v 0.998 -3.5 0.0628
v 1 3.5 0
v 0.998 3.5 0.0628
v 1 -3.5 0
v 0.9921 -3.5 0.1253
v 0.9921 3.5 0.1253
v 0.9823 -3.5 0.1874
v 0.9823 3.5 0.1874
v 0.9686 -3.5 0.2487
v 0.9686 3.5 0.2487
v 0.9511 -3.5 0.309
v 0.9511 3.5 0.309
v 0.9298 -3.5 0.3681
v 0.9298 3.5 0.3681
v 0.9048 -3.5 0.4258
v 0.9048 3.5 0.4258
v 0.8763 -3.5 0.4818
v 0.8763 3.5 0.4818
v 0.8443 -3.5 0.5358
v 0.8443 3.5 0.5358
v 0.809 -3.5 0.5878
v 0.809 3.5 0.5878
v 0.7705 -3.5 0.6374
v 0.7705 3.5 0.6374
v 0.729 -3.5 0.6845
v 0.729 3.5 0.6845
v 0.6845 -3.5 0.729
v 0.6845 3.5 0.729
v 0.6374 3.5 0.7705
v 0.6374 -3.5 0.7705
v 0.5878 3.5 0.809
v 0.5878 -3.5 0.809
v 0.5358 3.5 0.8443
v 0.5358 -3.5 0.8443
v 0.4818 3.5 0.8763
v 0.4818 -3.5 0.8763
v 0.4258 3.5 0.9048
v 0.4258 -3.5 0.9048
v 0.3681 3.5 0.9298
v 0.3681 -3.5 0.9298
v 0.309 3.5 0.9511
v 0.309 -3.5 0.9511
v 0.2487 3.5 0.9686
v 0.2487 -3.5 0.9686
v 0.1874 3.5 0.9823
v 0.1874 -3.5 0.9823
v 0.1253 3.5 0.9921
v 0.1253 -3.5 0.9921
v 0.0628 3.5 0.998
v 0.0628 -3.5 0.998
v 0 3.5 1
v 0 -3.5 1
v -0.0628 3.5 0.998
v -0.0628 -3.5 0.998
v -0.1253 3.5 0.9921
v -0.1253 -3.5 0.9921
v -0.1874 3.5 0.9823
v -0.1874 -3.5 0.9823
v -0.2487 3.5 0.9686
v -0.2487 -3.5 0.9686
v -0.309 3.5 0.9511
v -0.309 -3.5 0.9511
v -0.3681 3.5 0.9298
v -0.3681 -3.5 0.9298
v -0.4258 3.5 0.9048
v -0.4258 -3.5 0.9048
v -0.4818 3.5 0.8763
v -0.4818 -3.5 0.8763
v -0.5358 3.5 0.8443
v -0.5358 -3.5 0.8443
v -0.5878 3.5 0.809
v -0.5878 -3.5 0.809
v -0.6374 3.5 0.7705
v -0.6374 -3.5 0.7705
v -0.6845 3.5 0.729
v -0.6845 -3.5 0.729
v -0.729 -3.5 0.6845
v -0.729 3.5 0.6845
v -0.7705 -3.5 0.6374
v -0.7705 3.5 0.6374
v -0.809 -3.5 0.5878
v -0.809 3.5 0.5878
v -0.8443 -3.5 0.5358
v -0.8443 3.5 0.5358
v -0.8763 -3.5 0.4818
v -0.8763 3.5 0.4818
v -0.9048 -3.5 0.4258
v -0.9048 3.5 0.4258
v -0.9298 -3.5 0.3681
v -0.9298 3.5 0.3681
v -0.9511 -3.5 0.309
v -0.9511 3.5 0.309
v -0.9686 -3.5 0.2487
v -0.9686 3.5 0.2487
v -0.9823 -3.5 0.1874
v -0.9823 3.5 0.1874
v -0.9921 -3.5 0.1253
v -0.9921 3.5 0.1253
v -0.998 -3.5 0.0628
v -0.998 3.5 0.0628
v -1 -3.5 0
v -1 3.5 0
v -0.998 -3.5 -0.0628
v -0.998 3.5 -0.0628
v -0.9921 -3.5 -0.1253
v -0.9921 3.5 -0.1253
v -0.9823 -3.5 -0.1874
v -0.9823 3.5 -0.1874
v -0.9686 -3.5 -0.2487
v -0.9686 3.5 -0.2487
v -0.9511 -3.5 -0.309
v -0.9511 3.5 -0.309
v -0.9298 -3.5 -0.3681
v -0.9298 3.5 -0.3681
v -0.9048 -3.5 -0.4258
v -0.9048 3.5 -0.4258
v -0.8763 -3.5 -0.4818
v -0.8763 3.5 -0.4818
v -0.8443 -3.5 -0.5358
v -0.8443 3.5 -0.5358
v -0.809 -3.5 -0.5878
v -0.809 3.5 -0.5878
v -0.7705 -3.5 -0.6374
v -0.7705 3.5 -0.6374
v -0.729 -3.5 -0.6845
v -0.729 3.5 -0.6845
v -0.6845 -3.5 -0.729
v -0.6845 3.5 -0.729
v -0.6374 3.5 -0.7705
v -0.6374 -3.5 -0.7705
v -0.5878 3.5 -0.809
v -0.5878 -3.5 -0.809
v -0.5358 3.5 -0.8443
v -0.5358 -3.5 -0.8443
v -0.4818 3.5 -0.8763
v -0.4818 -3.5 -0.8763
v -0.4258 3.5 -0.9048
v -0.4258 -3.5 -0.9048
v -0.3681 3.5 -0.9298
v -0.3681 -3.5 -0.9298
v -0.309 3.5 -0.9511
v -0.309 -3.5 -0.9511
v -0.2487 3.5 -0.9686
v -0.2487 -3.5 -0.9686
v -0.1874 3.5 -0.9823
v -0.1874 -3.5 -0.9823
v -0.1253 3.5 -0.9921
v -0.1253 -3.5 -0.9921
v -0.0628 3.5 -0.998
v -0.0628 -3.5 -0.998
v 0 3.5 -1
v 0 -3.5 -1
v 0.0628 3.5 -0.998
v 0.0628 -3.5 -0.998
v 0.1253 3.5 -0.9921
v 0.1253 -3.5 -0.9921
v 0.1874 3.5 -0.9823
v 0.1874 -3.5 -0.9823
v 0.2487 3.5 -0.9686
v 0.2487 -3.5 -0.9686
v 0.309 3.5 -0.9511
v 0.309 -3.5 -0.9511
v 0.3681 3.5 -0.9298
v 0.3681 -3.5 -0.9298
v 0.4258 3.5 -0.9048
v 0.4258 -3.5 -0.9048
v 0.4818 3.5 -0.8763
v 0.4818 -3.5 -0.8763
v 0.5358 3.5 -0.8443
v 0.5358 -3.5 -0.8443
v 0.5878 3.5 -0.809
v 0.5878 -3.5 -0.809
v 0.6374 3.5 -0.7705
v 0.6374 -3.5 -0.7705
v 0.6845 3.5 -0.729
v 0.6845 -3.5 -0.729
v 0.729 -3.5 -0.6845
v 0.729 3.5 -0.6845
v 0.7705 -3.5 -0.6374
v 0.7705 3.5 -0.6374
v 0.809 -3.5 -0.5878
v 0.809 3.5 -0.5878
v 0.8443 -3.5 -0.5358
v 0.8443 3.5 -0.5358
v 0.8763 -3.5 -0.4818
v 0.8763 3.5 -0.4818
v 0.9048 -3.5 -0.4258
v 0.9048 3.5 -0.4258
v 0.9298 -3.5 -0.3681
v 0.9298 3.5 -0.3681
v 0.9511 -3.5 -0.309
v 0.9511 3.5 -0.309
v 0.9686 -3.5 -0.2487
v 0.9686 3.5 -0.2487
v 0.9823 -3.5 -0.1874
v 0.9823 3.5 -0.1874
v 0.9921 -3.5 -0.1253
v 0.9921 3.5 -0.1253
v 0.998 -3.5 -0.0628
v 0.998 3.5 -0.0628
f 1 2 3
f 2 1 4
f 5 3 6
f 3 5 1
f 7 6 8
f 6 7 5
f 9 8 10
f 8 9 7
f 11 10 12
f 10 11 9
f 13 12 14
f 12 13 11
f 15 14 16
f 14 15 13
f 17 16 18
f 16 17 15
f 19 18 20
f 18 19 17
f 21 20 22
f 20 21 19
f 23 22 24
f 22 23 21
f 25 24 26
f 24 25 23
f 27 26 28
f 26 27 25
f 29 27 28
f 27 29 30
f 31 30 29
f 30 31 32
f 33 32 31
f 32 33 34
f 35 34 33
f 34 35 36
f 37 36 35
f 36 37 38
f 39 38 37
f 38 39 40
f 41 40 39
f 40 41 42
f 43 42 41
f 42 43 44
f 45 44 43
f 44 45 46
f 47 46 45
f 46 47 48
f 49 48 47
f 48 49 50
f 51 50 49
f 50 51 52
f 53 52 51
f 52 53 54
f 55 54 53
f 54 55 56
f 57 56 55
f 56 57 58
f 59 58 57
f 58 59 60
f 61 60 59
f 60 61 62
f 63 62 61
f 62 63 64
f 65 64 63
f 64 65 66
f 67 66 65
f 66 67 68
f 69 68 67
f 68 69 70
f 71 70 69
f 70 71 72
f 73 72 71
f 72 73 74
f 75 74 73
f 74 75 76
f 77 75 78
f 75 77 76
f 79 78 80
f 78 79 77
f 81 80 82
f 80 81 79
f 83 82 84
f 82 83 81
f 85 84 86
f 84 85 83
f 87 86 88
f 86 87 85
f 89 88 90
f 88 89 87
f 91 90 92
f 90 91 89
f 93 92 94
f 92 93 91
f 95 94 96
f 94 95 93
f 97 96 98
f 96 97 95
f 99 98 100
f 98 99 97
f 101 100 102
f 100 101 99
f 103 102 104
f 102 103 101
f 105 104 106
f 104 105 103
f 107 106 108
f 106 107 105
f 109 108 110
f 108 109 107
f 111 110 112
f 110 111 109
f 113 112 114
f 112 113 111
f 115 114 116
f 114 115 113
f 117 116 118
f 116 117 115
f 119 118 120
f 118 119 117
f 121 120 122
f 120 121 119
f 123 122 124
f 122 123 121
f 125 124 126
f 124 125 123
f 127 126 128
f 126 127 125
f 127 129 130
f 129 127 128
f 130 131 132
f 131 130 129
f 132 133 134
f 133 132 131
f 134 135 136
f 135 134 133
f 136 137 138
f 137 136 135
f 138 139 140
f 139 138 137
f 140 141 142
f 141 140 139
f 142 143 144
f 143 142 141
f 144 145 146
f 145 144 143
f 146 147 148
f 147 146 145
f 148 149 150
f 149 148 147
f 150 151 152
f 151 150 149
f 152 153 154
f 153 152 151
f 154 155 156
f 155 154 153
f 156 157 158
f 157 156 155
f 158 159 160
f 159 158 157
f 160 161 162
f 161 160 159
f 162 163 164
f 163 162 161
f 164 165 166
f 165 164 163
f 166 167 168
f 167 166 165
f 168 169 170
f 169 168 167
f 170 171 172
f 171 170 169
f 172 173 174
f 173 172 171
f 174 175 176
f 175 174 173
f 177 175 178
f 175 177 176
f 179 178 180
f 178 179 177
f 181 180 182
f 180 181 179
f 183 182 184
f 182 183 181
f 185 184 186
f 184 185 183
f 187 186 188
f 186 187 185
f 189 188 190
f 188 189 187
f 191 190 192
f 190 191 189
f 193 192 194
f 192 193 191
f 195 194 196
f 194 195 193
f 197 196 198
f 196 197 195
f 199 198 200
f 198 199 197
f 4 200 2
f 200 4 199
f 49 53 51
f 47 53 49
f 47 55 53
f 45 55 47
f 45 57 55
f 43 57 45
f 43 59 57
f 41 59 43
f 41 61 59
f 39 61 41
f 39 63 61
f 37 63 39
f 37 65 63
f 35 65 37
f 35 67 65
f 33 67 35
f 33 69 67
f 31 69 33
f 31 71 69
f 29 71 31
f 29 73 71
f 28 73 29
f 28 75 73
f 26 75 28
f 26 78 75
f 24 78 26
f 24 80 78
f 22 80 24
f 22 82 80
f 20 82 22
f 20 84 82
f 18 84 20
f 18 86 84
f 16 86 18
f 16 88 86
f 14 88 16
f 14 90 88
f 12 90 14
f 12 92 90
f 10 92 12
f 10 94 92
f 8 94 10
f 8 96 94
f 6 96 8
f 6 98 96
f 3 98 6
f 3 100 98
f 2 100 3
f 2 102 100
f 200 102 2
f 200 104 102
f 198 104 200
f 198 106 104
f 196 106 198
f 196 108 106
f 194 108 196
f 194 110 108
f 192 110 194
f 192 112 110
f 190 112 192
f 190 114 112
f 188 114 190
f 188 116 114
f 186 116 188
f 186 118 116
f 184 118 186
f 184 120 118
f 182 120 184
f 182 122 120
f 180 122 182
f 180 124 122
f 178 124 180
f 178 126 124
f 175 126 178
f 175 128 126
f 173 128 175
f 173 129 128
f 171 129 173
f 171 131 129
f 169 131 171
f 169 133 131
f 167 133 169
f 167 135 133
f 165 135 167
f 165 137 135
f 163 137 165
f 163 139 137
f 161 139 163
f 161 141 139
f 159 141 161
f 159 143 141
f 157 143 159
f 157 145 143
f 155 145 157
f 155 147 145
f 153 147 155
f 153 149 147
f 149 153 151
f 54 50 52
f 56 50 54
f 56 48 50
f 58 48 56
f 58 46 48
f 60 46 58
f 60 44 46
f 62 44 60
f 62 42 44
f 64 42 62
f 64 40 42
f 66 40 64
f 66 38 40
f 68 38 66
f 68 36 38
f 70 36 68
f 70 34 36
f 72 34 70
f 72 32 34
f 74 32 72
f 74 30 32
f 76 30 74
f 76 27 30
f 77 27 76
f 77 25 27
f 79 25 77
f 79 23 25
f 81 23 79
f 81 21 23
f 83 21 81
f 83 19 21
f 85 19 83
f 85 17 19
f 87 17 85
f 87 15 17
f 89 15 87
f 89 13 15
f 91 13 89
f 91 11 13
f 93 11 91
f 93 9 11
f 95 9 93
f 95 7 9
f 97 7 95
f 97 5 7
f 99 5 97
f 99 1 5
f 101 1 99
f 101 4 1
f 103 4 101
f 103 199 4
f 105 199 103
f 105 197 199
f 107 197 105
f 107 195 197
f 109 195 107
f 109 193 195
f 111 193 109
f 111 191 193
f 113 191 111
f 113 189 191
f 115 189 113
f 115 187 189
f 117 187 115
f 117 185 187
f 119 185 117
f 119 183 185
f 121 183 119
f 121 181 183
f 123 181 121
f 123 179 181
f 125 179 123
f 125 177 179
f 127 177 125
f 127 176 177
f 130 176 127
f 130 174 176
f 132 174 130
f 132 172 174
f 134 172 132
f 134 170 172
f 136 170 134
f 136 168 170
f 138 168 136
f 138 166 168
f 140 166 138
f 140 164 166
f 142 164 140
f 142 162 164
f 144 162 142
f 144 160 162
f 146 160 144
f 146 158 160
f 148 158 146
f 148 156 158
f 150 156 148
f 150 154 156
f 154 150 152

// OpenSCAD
// ===============================
// Pieza: eje_pata
// Función: Sirve como eje para las patas abatibles del tablero
// Autor: Carlos & ChatGPT
// ===============================

// Parámetros principales
// altura_cuerpo = 3.7;
// ancho_cuerpo = 3.0;
// profundidad_cuerpo = 2.0;

// radio_semicirculo = 1.5;
// altura_semicirculo = radio_semicirculo;

// radio_cilindro = 1.5;
// largo_cilindro = 7.0; // total, sobresale a ambos lados

// radio_agujero = 1.0; // para insertar la pata

// $fn = 100; // suavizado

// // ===============================
// // Módulo principal
// module eje_pata() {
    
//     // --- Parte rectangular ---
//     cube([ancho_cuerpo, profundidad_cuerpo, altura_cuerpo]);

//     // --- Parte superior semicilíndrica ---
//     translate([0, 0, altura_cuerpo])
//         cylinder(h=altura_semicirculo, r=radio_semicirculo);

//     // --- Cilindro horizontal que atraviesa la pieza ---
//     translate([-largo_cilindro/2 + ancho_cuerpo/2, profundidad_cuerpo/2, altura_cuerpo - 2.2])
//         rotate([0, 90, 0])
//             cylinder(h=largo_cilindro, r=radio_cilindro);

//     // --- Agujero interno para insertar la pata ---
//     translate([-largo_cilindro/2 + ancho_cuerpo/2, profundidad_cuerpo/2, altura_cuerpo - 2.2])
//         rotate([0, 90, 0])
//             cylinder(h=largo_cilindro, r=radio_agujero);
// }

// // Llamada al módulo
// eje_pata();


//////
// ===============================
// Pieza: eje_pata
// Función: Sirve como eje para las patas abatibles del tablero
// Autor: Carlos & ChatGPT
// ===============================


// ==========================
// Parámetros configurables
// ==========================
radio_eje = 1.0;       // 1 cm = diámetro 2 cm
largo_eje = 7.0;       // 7 cm de largo
$fn = 100;             // suavidad del cilindro

// ==========================
// Módulo de eje horizontal
// ==========================
module eje_horizontal() {
    rotate([90, 0, 0])  // gira para alinearse con eje Y
        cylinder(h = largo_eje, r = radio_eje, center = true);
}

// Llamada al módulo
eje_horizontal();

// $fn = 100; // suavizado

// module aro_sobre_eje() {
//     difference() {
//         // Círculo exterior (diámetro 2 cm, radio 1 cm)
//         translate([0, 0, 0])
//             cylinder(h=2.0, r=1.0, center=true);

//         // Agujero interior (diámetro 1 cm, radio 0.5 cm)
//         translate([0, 0, 0])
//             cylinder(h=2.0 + 0.1, r=0.5, center=true); // +0.1 para evitar que quede una capa delgada
//     }
// }

// // Llamada al módulo
// translate([90, 0, 0]) // Eleva el aro para que quede centrado en el eje
//     aro_sobre_eje();
